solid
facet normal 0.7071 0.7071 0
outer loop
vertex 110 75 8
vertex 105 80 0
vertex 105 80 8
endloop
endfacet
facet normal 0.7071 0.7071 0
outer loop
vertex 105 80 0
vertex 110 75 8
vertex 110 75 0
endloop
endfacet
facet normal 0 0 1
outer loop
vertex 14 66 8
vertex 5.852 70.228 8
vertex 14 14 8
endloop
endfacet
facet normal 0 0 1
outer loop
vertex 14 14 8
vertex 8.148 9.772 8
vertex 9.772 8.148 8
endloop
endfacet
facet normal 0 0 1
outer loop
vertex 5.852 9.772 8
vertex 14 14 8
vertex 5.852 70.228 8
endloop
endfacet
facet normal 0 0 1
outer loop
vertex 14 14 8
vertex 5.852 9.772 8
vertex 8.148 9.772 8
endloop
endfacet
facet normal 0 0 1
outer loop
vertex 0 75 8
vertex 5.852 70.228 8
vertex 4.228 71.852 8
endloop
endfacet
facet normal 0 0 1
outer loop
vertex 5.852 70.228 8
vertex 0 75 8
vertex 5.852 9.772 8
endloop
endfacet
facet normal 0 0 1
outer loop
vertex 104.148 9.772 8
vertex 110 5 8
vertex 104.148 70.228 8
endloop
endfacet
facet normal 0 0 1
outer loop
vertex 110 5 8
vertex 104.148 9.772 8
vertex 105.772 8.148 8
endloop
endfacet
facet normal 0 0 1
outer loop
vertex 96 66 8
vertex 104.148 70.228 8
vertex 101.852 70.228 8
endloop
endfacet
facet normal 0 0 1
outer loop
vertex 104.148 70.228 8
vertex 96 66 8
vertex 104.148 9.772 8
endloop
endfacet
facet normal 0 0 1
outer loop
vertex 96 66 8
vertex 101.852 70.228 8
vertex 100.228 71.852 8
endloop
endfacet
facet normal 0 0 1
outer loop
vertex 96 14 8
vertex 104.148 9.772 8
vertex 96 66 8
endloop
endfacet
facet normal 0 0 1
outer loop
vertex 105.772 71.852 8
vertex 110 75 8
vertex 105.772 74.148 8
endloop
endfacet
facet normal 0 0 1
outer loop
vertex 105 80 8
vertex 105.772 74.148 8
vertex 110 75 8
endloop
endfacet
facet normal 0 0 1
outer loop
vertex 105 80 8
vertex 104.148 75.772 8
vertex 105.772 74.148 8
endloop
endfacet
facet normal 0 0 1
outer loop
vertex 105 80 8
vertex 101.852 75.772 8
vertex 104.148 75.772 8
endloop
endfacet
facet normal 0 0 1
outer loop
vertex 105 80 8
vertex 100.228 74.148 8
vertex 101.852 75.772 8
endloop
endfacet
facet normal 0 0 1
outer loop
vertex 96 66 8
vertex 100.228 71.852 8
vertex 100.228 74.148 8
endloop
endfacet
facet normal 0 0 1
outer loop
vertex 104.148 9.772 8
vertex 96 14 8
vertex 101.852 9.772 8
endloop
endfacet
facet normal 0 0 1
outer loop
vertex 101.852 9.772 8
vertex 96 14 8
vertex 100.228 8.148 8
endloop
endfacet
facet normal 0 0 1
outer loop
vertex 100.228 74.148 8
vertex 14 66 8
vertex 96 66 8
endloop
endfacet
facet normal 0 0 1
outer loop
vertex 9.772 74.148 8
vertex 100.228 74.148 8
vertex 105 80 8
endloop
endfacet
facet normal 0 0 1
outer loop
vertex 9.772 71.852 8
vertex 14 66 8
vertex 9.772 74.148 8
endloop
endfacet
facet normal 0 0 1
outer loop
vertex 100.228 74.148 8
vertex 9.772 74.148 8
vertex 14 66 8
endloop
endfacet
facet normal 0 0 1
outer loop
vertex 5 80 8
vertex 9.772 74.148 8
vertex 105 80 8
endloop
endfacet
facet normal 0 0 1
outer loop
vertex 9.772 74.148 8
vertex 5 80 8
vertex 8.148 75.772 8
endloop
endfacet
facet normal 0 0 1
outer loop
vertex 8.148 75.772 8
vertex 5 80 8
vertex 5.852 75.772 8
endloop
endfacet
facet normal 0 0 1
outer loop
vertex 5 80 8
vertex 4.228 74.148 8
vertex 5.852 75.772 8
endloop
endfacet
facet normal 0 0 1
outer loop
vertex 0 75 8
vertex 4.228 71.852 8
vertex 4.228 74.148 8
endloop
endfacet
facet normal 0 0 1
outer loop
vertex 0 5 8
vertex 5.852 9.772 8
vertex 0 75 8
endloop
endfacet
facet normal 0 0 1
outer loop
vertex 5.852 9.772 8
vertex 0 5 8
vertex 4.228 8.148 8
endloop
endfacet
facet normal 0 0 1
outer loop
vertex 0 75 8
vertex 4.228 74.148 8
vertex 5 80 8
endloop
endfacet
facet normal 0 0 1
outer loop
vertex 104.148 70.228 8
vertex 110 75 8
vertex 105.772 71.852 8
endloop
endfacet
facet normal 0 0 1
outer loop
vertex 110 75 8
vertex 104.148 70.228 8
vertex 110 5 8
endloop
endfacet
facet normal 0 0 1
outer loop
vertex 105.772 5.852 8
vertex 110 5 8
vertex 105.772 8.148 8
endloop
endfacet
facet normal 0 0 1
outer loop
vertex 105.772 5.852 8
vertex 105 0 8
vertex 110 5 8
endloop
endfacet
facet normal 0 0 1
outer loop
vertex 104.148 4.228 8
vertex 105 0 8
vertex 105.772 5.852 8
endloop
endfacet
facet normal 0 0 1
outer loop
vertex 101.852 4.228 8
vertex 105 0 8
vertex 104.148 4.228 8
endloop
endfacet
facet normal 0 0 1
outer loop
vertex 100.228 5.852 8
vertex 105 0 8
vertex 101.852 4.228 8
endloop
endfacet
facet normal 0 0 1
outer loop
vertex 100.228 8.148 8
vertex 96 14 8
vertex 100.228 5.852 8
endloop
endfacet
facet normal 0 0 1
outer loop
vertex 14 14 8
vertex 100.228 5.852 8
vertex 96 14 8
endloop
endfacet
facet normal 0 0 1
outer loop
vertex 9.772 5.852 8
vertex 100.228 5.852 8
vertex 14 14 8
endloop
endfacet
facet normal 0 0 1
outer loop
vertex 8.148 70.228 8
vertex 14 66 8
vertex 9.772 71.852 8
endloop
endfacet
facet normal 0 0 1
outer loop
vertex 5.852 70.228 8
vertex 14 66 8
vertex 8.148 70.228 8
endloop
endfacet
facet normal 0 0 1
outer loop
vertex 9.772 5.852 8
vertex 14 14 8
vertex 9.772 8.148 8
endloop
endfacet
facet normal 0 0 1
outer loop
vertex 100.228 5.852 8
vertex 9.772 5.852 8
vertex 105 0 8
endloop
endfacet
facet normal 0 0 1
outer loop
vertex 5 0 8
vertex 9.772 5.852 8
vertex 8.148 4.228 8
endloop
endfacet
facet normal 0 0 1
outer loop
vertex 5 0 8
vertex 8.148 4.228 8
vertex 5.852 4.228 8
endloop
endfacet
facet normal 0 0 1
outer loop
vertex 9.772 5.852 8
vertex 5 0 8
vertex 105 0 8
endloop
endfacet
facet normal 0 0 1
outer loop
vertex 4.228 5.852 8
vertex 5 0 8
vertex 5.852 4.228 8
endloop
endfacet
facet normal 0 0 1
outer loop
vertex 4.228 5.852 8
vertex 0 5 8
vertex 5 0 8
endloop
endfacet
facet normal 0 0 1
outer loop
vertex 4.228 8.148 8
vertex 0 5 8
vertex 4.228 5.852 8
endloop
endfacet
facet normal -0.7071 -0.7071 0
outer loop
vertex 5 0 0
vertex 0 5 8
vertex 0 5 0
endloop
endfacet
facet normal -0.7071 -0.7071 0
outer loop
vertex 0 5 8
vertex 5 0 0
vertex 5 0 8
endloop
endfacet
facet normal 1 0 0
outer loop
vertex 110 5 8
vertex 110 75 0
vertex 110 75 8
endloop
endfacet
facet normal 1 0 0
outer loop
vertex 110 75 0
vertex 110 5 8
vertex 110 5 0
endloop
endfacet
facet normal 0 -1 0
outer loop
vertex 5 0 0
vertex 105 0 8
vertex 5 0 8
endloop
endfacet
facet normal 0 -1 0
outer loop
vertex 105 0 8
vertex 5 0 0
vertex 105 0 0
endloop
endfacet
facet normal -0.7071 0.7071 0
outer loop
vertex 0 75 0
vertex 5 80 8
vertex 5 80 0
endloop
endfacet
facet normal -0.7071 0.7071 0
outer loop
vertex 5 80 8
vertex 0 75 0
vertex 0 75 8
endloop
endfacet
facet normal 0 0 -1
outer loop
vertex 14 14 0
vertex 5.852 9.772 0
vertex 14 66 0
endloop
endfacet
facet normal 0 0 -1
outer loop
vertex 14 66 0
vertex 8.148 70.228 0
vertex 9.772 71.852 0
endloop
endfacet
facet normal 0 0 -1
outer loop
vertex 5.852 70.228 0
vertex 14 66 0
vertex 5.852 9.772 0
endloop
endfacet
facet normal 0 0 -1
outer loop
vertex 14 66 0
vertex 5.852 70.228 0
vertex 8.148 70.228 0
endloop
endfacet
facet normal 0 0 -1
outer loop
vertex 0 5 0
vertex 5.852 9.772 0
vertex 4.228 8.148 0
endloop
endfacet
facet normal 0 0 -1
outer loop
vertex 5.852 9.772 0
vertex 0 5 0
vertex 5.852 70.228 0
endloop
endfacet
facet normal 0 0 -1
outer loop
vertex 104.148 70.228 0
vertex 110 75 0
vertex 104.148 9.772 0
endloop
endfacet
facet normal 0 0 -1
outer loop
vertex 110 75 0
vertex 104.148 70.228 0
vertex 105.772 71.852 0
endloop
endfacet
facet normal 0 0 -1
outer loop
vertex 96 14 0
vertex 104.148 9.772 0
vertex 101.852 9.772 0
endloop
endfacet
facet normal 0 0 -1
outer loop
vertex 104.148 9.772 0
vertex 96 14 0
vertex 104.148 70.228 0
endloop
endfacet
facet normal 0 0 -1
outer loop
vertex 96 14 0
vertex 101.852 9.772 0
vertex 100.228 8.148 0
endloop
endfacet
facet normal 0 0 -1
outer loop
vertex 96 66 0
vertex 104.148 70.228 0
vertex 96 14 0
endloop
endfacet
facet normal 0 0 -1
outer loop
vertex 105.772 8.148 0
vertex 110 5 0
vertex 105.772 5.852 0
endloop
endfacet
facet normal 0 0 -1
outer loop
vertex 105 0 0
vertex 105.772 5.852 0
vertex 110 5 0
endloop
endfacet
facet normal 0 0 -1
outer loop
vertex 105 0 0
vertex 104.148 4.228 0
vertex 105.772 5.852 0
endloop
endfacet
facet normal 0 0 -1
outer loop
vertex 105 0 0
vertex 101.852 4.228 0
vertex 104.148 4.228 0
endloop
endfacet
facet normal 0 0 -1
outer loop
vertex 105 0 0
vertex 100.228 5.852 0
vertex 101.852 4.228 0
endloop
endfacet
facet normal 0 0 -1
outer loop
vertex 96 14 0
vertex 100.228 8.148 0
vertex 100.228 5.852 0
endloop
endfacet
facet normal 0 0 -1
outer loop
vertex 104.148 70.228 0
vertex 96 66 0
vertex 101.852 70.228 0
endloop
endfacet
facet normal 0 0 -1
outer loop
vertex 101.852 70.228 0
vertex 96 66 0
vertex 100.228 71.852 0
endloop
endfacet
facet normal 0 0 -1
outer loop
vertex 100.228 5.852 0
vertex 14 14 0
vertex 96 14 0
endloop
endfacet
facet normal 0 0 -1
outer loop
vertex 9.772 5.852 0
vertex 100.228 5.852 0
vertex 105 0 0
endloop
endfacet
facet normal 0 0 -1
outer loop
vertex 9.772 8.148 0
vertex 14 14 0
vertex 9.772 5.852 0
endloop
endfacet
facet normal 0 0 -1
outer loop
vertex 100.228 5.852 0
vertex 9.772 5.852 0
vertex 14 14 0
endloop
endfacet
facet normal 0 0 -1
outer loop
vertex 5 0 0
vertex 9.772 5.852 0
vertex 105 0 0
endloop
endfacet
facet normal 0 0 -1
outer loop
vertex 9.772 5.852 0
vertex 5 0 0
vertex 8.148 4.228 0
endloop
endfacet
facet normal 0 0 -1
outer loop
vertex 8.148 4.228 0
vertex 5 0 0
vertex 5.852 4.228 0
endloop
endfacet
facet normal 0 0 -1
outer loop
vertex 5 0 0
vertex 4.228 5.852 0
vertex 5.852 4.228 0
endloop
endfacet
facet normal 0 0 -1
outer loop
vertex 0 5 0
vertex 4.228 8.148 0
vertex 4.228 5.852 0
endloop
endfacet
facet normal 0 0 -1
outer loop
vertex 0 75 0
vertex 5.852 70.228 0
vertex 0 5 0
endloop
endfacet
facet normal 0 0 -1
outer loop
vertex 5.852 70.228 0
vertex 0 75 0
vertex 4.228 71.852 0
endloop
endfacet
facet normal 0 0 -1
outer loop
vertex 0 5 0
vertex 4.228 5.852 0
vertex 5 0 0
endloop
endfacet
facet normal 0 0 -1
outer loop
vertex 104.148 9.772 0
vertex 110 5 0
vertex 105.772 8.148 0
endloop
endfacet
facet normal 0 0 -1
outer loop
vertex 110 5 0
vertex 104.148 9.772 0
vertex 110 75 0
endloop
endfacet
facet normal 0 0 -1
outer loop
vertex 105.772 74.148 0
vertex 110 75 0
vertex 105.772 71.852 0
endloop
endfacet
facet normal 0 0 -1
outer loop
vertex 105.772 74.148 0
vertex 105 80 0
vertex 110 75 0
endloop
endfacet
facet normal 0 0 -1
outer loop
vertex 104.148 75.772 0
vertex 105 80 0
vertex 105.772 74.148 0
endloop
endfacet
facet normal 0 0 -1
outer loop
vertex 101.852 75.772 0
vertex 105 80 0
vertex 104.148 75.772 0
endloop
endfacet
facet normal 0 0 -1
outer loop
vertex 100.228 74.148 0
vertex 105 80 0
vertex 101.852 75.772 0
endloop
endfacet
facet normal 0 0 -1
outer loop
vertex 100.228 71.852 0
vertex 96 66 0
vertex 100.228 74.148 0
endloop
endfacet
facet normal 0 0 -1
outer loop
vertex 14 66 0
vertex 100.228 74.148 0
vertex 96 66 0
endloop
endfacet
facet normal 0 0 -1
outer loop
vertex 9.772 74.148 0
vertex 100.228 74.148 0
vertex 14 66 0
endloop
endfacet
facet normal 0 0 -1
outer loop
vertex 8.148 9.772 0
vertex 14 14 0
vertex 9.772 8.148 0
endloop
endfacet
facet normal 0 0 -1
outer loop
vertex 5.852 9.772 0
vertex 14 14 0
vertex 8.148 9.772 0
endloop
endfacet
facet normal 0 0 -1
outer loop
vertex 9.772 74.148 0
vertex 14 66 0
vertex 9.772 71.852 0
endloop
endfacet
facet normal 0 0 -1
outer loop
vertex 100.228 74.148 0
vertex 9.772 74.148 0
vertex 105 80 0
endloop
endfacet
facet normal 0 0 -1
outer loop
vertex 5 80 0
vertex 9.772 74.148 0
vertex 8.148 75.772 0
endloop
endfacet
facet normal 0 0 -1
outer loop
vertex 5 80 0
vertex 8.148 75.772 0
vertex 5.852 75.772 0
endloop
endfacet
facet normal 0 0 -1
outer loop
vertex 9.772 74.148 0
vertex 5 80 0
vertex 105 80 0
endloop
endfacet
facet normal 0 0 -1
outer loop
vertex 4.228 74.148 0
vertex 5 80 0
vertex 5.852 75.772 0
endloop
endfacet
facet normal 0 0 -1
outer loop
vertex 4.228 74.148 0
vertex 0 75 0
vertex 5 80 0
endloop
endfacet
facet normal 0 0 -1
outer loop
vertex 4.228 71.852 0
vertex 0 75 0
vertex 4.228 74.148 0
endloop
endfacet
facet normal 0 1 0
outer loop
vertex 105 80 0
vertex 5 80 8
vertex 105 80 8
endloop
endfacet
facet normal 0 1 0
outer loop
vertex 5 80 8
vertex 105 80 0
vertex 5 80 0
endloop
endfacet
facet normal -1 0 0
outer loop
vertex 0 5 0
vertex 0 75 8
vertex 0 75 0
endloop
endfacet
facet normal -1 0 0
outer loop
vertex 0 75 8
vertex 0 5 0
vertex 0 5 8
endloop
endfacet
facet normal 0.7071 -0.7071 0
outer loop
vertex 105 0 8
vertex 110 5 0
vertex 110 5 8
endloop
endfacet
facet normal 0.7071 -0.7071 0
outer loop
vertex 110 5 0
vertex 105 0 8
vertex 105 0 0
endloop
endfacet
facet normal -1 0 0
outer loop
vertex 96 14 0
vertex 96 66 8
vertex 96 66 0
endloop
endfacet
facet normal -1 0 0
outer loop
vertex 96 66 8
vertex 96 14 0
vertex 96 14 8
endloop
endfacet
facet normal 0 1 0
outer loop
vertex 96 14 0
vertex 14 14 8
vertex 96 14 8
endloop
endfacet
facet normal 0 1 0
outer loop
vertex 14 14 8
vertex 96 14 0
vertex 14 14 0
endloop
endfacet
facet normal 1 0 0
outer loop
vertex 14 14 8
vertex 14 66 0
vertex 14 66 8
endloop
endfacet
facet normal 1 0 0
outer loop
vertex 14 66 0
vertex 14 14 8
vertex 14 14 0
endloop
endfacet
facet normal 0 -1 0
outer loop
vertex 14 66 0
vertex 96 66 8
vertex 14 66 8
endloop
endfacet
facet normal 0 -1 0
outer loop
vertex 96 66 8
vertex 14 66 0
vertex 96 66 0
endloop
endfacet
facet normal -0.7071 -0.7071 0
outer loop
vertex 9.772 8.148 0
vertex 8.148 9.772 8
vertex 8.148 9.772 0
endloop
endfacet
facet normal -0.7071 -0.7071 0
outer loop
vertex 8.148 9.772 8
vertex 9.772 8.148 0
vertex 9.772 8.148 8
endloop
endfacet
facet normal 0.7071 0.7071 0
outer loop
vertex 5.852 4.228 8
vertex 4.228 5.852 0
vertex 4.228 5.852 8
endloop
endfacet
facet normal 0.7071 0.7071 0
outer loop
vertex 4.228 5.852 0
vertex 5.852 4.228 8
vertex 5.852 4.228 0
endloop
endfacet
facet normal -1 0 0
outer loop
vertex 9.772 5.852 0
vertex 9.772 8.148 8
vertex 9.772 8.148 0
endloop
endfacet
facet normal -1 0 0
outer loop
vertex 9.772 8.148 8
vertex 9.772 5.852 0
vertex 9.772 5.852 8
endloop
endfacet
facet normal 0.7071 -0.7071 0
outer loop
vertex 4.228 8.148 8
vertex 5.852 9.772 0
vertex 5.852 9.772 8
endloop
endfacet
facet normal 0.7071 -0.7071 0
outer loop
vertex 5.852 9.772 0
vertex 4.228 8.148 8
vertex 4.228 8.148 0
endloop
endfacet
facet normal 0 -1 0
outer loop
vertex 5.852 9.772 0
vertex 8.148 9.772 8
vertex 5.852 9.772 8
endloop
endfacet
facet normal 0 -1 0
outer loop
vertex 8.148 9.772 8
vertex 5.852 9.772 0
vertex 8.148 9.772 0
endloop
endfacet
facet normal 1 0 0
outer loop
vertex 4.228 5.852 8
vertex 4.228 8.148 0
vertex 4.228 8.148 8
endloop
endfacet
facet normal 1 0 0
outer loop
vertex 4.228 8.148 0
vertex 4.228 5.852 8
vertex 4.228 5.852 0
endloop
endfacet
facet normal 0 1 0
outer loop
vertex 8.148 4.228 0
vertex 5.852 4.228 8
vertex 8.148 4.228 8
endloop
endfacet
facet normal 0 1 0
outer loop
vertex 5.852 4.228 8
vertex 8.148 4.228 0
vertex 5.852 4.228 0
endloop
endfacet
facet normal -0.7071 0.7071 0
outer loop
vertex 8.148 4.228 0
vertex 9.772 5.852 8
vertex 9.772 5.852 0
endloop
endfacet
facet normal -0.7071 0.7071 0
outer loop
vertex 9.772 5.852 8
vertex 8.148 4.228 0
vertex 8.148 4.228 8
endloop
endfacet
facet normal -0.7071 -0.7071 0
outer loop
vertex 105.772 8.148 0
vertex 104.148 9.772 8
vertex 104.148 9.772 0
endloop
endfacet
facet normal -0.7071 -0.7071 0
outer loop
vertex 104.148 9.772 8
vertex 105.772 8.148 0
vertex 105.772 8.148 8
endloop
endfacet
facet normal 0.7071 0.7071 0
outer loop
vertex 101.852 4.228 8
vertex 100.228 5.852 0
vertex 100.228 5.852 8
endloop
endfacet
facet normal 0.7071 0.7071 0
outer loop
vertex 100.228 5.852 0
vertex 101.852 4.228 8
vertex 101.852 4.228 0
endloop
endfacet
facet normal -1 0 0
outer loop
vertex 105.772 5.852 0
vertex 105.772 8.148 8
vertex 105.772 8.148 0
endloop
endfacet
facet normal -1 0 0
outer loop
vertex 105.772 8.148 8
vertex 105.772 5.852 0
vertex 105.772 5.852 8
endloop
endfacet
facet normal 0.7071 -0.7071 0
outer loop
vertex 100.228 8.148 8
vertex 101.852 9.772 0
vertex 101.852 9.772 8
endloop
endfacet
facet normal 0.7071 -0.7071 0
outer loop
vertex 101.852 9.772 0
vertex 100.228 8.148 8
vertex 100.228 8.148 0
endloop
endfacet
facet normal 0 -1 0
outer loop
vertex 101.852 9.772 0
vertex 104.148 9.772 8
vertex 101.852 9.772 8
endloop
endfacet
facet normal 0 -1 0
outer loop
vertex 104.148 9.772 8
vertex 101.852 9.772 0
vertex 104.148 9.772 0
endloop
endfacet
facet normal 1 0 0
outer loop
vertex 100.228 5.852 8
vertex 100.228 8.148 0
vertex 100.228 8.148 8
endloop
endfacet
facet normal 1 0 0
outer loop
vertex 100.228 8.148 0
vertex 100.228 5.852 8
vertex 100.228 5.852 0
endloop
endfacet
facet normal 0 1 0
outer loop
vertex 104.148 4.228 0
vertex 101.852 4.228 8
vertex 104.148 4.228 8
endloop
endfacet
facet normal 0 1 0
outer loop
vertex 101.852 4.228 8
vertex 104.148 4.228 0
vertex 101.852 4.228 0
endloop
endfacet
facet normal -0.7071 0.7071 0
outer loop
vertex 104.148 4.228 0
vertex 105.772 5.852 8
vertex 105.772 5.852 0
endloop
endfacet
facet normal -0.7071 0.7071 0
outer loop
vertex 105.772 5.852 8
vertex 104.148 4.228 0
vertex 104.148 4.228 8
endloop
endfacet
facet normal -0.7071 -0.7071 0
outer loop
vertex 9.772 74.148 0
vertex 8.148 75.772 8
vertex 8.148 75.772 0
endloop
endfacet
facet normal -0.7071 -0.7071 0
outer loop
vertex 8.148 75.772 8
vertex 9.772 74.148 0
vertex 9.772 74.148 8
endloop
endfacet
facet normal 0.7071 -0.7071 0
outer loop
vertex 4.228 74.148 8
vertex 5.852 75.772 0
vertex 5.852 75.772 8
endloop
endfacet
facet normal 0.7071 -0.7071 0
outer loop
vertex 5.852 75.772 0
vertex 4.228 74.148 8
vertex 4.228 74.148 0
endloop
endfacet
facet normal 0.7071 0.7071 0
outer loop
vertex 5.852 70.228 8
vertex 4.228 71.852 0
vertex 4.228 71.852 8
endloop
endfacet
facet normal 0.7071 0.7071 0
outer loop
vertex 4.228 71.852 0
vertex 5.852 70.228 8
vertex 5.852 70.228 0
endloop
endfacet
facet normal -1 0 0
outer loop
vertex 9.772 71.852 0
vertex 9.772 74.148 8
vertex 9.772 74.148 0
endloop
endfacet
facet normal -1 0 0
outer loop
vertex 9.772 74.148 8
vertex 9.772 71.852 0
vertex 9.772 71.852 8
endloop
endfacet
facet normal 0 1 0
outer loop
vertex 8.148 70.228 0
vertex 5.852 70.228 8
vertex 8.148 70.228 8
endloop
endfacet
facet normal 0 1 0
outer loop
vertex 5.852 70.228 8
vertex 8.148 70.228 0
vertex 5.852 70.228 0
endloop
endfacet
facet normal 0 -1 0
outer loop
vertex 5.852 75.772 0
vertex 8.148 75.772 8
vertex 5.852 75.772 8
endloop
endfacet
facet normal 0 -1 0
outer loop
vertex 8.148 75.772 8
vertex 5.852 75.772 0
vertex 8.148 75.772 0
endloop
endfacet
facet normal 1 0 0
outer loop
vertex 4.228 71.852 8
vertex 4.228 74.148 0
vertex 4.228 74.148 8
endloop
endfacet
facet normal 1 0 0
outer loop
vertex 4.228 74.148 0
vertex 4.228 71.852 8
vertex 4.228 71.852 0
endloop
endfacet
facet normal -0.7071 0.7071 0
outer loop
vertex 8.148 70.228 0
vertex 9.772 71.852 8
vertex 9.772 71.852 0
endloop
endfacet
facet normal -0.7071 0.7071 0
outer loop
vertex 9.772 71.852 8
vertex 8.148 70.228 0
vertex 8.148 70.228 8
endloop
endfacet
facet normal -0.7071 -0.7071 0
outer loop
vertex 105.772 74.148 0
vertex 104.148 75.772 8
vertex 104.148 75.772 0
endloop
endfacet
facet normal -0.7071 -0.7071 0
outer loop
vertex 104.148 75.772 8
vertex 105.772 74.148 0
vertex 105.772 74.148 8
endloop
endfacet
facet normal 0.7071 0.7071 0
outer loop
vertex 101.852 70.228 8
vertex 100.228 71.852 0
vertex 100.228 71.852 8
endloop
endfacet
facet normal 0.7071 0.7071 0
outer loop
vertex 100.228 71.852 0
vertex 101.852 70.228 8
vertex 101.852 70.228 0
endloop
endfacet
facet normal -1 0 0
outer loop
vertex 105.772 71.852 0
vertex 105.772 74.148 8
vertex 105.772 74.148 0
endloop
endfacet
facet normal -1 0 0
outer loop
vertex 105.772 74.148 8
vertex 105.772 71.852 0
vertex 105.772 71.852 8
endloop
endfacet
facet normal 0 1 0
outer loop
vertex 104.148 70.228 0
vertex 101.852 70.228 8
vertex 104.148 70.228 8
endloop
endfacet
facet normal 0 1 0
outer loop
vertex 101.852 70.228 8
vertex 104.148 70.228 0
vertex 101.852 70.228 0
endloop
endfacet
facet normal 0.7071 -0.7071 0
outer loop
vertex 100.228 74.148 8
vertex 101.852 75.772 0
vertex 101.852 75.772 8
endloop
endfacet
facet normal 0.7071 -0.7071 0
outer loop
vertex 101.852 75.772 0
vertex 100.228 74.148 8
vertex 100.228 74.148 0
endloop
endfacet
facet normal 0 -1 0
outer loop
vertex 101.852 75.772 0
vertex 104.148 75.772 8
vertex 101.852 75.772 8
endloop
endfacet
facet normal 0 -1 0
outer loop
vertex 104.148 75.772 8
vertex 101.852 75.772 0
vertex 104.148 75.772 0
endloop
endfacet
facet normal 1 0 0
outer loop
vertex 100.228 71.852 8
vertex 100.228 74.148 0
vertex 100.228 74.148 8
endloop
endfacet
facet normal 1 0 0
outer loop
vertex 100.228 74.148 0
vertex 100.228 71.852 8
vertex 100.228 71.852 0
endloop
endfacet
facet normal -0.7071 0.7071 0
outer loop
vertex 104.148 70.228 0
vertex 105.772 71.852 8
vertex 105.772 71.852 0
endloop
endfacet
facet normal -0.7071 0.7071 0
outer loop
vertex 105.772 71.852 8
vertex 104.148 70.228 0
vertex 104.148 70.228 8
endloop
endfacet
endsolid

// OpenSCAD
$fn = 32;

// ----------------------------------------------------------------------
// Frame plate: 110 x 80 frame, 14 mm rails
// ----------------------------------------------------------------------

// --- parameters (mm) ---
plate_l = 110;            // plate length, X
plate_w = 80;             // plate width, Y
plate_t = 8;              // plate thickness, Z (extrusion height)
corner_c = 5;             // corner chamfer
frame_bar = 14;           // frame rail width
bolt_r = 3;               // corner bolt window radius
bolt_inset = 7;           // bolt centre inset from the edges

win_l = plate_l - 2 * frame_bar;  // window length
win_w = plate_w - 2 * frame_bar;  // window width
bolt_d = 2 * bolt_r;  // corner hole diameter

profile = [[5, 0], [105, 0], [110, 5], [110, 75], [105, 80], [5, 80], [0, 75], [0, 5]];  // primary outline, 8 points, counter clockwise
void_1 = [[14, 14], [96, 14], [96, 66], [14, 66]];  // the window, 4 points
void_2 = [[9.772, 8.148], [8.148, 9.772], [5.852, 9.772], [4.228, 8.148], [4.228, 5.852], [5.852, 4.228], [8.148, 4.228], [9.772, 5.852]];  // corner bolt window, 8 points
void_3 = [[105.772, 8.148], [104.148, 9.772], [101.852, 9.772], [100.228, 8.148], [100.228, 5.852], [101.852, 4.228], [104.148, 4.228], [105.772, 5.852]];  // corner bolt window, 8 points
void_4 = [[9.772, 74.148], [8.148, 75.772], [5.852, 75.772], [4.228, 74.148], [4.228, 71.852], [5.852, 70.228], [8.148, 70.228], [9.772, 71.852]];  // corner bolt window, 8 points
void_5 = [[105.772, 74.148], [104.148, 75.772], [101.852, 75.772], [100.228, 74.148], [100.228, 71.852], [101.852, 70.228], [104.148, 70.228], [105.772, 71.852]];  // corner bolt window, 8 points

// --- the one profile operation ---
difference() {
  linear_extrude(height = plate_t) polygon(points = profile);
  translate([0, 0, -1])
    linear_extrude(height = plate_t + 2) polygon(points = void_1);
  translate([0, 0, -1])
    linear_extrude(height = plate_t + 2) polygon(points = void_2);
  translate([0, 0, -1])
    linear_extrude(height = plate_t + 2) polygon(points = void_3);
  translate([0, 0, -1])
    linear_extrude(height = plate_t + 2) polygon(points = void_4);
  translate([0, 0, -1])
    linear_extrude(height = plate_t + 2) polygon(points = void_5);
}
